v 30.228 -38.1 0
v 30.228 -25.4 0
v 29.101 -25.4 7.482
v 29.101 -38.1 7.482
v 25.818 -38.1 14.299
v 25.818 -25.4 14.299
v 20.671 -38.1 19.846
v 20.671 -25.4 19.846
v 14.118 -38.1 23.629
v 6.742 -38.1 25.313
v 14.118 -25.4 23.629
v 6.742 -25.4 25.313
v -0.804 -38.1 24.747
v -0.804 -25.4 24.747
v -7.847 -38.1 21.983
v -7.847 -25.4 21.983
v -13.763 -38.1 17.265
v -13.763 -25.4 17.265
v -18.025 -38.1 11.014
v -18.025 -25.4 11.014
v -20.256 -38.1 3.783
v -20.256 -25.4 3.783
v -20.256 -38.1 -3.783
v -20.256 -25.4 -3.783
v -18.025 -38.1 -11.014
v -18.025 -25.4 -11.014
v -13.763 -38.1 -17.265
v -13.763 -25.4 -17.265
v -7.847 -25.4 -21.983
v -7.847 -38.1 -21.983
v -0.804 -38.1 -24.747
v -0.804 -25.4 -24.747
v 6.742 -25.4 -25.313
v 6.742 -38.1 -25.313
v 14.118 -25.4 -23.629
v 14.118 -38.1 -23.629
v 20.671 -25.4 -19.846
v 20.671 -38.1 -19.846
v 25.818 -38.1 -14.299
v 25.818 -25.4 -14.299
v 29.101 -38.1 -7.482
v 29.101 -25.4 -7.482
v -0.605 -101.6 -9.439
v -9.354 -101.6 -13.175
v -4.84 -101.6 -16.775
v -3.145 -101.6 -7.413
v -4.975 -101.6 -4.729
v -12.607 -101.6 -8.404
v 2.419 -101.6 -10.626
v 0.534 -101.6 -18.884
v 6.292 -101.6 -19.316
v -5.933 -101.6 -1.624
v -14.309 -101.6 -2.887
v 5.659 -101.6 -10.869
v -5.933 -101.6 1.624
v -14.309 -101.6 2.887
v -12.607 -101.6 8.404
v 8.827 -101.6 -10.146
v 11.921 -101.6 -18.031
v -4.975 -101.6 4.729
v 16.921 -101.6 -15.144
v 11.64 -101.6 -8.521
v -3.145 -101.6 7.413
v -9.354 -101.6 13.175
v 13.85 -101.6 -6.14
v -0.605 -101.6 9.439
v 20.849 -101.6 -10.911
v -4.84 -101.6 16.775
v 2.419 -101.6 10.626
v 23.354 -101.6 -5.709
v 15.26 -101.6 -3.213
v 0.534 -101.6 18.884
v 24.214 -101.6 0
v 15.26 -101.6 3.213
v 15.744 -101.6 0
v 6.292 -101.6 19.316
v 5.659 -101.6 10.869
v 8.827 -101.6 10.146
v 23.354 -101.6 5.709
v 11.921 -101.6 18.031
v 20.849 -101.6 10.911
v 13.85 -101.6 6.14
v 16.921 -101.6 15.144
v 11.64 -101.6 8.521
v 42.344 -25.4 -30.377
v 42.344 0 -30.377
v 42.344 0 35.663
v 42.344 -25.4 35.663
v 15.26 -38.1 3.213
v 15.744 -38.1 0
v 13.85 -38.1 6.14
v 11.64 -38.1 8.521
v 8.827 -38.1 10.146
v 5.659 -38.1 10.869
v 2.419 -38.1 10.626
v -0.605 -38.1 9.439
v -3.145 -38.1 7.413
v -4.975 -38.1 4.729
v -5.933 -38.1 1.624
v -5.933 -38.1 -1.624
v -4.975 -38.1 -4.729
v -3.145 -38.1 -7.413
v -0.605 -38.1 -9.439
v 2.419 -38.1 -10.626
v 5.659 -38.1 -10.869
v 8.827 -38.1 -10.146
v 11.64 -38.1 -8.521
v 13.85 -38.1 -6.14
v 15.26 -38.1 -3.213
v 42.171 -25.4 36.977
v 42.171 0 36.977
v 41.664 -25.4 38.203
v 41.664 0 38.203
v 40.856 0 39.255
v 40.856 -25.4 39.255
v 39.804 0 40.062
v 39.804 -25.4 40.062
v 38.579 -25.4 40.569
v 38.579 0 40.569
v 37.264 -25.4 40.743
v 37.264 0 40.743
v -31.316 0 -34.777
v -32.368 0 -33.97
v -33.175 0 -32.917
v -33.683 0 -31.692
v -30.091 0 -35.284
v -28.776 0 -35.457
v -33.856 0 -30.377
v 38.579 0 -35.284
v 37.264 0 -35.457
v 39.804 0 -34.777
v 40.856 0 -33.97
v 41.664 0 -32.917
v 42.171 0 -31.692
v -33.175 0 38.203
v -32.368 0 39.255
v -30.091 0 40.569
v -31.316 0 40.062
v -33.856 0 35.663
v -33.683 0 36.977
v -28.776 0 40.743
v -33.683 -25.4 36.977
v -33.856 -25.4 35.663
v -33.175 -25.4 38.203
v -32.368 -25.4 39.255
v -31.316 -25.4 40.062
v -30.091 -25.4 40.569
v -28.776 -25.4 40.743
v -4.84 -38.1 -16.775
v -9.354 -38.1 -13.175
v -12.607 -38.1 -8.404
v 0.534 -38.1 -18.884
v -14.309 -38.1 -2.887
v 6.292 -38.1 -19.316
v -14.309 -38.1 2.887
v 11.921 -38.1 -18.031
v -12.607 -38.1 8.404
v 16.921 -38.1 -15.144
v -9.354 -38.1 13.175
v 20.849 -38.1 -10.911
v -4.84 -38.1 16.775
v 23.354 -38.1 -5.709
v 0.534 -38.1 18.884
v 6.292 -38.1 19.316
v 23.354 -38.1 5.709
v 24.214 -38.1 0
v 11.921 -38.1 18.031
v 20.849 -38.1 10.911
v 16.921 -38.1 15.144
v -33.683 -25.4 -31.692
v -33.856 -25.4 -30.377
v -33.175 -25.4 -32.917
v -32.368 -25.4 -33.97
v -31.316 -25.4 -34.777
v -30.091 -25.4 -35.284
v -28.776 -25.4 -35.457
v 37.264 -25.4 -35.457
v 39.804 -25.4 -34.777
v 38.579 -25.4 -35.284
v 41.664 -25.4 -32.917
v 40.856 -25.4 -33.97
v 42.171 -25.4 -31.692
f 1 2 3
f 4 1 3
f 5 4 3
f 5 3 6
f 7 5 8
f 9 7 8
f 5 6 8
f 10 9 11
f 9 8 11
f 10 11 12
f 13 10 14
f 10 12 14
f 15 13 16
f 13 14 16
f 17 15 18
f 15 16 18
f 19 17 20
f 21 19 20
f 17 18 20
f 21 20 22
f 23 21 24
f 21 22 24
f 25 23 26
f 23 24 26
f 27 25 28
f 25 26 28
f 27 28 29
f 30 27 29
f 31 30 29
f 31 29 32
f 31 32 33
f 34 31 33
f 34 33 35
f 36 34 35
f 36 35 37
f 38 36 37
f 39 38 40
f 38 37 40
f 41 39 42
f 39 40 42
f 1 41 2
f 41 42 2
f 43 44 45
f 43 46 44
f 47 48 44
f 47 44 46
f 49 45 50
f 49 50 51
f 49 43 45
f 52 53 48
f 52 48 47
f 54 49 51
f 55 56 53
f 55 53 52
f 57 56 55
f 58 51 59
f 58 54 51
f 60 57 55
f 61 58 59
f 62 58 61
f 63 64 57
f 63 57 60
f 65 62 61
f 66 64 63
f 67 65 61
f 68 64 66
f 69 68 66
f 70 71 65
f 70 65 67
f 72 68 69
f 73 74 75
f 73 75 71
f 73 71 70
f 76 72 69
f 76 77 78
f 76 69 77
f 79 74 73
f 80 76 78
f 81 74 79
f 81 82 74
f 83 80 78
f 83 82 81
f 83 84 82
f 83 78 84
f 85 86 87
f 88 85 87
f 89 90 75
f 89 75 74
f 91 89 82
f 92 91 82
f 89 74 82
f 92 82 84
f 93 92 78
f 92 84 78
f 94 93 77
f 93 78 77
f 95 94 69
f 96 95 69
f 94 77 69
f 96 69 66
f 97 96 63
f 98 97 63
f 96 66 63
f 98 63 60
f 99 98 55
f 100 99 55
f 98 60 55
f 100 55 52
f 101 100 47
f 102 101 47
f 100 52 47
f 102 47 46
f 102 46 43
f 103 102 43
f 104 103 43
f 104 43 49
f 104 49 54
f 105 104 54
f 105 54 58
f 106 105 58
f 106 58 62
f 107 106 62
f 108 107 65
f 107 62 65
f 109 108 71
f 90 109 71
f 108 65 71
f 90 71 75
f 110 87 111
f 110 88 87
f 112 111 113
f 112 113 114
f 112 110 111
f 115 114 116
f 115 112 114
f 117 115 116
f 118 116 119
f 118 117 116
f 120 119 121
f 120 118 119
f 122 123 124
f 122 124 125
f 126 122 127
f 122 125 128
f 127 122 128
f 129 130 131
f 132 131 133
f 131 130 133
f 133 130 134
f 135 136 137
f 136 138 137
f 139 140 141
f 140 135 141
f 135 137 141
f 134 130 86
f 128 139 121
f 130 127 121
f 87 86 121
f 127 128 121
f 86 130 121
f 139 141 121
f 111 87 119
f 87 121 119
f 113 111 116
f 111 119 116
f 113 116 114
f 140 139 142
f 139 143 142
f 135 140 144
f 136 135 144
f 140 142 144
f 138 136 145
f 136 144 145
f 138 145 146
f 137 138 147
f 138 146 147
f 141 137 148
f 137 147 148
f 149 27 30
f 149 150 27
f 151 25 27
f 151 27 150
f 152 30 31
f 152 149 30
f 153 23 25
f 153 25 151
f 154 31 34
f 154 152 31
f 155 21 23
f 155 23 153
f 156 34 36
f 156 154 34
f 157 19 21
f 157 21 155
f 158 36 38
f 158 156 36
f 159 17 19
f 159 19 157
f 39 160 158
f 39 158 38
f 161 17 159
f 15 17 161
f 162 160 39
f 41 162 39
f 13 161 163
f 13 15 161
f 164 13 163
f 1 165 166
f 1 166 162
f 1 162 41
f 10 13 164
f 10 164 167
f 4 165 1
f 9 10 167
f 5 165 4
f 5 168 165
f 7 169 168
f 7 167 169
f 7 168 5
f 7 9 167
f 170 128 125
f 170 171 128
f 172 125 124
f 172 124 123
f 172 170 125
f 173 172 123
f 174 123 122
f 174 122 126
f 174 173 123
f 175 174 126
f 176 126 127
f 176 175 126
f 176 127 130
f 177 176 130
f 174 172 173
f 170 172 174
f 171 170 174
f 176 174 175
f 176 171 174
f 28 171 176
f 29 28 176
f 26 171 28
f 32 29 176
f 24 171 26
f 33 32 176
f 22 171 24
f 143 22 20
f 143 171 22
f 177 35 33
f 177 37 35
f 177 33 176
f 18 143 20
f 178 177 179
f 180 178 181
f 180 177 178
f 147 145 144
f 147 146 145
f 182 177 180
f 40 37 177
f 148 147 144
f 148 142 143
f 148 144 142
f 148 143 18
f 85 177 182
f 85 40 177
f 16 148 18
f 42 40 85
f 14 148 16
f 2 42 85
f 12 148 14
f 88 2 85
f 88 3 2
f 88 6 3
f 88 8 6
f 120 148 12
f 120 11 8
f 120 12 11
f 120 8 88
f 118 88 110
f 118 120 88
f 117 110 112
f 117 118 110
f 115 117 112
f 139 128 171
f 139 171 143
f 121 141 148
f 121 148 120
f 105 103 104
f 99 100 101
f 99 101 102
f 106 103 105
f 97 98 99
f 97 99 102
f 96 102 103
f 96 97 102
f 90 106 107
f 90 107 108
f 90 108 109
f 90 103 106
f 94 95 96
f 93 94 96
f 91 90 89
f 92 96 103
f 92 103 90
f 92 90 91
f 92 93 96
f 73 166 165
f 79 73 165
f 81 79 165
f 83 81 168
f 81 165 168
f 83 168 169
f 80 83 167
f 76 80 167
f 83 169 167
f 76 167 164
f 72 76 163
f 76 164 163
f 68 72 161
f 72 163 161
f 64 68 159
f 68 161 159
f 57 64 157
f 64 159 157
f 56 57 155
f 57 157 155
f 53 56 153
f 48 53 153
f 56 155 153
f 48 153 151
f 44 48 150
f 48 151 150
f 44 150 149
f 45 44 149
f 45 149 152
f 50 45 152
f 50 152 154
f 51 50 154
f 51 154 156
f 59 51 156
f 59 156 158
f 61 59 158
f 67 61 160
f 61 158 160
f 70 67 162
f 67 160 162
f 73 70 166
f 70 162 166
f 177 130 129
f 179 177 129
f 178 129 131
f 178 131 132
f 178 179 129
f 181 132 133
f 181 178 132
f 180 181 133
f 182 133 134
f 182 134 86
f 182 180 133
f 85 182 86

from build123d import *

# Parameters (mm, degrees)
F0_W     = 76.2
F0_H     = 76.2
F1_DEPTH = 25.4
F2_R     = 5.08
F3_R     = 25.383662
F4_DEPTH = 12.7
F5_R     = 19.36967
F6_DEPTH = 63.5
F7_R     = 10.899394
F8_DEPTH = 63.5


with BuildPart() as f1:
    # F0 (on Front) → F1 (new body)
    with BuildSketch(Plane.XZ):
        with Locations((4.244136, 2.642533)):
            Rectangle(F0_W, F0_H)
    extrude(amount=F1_DEPTH)

    # F2
    f2_edges = [f1.edges().sort_by_distance(p)[0] for p in [
        (-33.855864, -12.7, 40.742533),
        (42.344136, -12.7, 40.742533),
        (42.344136, -12.7, -35.457467),
        (-33.855864, -12.7, -35.457467),
    ]]
    fillet(f2_edges, radius=F2_R)

    # F3 (on face) → F4 (join)
    with BuildSketch(Plane.XZ.offset(25.4)):
        with Locations((4.844644, 0)):
            Circle(F3_R)
    extrude(amount=F4_DEPTH)

    # F5 (on face) → F6 (join)
    with BuildSketch(Plane.XZ.offset(38.1)):
        with Locations((4.844644, 0)):
            Circle(F5_R)
    extrude(amount=F6_DEPTH)

    # F7 (on face) → F8 (cut)
    with BuildSketch(Plane.XZ.offset(101.6)):
        with Locations((4.844644, 0)):
            Circle(F7_R)
    extrude(amount=-F8_DEPTH, mode=Mode.SUBTRACT)


solid = f1.part
